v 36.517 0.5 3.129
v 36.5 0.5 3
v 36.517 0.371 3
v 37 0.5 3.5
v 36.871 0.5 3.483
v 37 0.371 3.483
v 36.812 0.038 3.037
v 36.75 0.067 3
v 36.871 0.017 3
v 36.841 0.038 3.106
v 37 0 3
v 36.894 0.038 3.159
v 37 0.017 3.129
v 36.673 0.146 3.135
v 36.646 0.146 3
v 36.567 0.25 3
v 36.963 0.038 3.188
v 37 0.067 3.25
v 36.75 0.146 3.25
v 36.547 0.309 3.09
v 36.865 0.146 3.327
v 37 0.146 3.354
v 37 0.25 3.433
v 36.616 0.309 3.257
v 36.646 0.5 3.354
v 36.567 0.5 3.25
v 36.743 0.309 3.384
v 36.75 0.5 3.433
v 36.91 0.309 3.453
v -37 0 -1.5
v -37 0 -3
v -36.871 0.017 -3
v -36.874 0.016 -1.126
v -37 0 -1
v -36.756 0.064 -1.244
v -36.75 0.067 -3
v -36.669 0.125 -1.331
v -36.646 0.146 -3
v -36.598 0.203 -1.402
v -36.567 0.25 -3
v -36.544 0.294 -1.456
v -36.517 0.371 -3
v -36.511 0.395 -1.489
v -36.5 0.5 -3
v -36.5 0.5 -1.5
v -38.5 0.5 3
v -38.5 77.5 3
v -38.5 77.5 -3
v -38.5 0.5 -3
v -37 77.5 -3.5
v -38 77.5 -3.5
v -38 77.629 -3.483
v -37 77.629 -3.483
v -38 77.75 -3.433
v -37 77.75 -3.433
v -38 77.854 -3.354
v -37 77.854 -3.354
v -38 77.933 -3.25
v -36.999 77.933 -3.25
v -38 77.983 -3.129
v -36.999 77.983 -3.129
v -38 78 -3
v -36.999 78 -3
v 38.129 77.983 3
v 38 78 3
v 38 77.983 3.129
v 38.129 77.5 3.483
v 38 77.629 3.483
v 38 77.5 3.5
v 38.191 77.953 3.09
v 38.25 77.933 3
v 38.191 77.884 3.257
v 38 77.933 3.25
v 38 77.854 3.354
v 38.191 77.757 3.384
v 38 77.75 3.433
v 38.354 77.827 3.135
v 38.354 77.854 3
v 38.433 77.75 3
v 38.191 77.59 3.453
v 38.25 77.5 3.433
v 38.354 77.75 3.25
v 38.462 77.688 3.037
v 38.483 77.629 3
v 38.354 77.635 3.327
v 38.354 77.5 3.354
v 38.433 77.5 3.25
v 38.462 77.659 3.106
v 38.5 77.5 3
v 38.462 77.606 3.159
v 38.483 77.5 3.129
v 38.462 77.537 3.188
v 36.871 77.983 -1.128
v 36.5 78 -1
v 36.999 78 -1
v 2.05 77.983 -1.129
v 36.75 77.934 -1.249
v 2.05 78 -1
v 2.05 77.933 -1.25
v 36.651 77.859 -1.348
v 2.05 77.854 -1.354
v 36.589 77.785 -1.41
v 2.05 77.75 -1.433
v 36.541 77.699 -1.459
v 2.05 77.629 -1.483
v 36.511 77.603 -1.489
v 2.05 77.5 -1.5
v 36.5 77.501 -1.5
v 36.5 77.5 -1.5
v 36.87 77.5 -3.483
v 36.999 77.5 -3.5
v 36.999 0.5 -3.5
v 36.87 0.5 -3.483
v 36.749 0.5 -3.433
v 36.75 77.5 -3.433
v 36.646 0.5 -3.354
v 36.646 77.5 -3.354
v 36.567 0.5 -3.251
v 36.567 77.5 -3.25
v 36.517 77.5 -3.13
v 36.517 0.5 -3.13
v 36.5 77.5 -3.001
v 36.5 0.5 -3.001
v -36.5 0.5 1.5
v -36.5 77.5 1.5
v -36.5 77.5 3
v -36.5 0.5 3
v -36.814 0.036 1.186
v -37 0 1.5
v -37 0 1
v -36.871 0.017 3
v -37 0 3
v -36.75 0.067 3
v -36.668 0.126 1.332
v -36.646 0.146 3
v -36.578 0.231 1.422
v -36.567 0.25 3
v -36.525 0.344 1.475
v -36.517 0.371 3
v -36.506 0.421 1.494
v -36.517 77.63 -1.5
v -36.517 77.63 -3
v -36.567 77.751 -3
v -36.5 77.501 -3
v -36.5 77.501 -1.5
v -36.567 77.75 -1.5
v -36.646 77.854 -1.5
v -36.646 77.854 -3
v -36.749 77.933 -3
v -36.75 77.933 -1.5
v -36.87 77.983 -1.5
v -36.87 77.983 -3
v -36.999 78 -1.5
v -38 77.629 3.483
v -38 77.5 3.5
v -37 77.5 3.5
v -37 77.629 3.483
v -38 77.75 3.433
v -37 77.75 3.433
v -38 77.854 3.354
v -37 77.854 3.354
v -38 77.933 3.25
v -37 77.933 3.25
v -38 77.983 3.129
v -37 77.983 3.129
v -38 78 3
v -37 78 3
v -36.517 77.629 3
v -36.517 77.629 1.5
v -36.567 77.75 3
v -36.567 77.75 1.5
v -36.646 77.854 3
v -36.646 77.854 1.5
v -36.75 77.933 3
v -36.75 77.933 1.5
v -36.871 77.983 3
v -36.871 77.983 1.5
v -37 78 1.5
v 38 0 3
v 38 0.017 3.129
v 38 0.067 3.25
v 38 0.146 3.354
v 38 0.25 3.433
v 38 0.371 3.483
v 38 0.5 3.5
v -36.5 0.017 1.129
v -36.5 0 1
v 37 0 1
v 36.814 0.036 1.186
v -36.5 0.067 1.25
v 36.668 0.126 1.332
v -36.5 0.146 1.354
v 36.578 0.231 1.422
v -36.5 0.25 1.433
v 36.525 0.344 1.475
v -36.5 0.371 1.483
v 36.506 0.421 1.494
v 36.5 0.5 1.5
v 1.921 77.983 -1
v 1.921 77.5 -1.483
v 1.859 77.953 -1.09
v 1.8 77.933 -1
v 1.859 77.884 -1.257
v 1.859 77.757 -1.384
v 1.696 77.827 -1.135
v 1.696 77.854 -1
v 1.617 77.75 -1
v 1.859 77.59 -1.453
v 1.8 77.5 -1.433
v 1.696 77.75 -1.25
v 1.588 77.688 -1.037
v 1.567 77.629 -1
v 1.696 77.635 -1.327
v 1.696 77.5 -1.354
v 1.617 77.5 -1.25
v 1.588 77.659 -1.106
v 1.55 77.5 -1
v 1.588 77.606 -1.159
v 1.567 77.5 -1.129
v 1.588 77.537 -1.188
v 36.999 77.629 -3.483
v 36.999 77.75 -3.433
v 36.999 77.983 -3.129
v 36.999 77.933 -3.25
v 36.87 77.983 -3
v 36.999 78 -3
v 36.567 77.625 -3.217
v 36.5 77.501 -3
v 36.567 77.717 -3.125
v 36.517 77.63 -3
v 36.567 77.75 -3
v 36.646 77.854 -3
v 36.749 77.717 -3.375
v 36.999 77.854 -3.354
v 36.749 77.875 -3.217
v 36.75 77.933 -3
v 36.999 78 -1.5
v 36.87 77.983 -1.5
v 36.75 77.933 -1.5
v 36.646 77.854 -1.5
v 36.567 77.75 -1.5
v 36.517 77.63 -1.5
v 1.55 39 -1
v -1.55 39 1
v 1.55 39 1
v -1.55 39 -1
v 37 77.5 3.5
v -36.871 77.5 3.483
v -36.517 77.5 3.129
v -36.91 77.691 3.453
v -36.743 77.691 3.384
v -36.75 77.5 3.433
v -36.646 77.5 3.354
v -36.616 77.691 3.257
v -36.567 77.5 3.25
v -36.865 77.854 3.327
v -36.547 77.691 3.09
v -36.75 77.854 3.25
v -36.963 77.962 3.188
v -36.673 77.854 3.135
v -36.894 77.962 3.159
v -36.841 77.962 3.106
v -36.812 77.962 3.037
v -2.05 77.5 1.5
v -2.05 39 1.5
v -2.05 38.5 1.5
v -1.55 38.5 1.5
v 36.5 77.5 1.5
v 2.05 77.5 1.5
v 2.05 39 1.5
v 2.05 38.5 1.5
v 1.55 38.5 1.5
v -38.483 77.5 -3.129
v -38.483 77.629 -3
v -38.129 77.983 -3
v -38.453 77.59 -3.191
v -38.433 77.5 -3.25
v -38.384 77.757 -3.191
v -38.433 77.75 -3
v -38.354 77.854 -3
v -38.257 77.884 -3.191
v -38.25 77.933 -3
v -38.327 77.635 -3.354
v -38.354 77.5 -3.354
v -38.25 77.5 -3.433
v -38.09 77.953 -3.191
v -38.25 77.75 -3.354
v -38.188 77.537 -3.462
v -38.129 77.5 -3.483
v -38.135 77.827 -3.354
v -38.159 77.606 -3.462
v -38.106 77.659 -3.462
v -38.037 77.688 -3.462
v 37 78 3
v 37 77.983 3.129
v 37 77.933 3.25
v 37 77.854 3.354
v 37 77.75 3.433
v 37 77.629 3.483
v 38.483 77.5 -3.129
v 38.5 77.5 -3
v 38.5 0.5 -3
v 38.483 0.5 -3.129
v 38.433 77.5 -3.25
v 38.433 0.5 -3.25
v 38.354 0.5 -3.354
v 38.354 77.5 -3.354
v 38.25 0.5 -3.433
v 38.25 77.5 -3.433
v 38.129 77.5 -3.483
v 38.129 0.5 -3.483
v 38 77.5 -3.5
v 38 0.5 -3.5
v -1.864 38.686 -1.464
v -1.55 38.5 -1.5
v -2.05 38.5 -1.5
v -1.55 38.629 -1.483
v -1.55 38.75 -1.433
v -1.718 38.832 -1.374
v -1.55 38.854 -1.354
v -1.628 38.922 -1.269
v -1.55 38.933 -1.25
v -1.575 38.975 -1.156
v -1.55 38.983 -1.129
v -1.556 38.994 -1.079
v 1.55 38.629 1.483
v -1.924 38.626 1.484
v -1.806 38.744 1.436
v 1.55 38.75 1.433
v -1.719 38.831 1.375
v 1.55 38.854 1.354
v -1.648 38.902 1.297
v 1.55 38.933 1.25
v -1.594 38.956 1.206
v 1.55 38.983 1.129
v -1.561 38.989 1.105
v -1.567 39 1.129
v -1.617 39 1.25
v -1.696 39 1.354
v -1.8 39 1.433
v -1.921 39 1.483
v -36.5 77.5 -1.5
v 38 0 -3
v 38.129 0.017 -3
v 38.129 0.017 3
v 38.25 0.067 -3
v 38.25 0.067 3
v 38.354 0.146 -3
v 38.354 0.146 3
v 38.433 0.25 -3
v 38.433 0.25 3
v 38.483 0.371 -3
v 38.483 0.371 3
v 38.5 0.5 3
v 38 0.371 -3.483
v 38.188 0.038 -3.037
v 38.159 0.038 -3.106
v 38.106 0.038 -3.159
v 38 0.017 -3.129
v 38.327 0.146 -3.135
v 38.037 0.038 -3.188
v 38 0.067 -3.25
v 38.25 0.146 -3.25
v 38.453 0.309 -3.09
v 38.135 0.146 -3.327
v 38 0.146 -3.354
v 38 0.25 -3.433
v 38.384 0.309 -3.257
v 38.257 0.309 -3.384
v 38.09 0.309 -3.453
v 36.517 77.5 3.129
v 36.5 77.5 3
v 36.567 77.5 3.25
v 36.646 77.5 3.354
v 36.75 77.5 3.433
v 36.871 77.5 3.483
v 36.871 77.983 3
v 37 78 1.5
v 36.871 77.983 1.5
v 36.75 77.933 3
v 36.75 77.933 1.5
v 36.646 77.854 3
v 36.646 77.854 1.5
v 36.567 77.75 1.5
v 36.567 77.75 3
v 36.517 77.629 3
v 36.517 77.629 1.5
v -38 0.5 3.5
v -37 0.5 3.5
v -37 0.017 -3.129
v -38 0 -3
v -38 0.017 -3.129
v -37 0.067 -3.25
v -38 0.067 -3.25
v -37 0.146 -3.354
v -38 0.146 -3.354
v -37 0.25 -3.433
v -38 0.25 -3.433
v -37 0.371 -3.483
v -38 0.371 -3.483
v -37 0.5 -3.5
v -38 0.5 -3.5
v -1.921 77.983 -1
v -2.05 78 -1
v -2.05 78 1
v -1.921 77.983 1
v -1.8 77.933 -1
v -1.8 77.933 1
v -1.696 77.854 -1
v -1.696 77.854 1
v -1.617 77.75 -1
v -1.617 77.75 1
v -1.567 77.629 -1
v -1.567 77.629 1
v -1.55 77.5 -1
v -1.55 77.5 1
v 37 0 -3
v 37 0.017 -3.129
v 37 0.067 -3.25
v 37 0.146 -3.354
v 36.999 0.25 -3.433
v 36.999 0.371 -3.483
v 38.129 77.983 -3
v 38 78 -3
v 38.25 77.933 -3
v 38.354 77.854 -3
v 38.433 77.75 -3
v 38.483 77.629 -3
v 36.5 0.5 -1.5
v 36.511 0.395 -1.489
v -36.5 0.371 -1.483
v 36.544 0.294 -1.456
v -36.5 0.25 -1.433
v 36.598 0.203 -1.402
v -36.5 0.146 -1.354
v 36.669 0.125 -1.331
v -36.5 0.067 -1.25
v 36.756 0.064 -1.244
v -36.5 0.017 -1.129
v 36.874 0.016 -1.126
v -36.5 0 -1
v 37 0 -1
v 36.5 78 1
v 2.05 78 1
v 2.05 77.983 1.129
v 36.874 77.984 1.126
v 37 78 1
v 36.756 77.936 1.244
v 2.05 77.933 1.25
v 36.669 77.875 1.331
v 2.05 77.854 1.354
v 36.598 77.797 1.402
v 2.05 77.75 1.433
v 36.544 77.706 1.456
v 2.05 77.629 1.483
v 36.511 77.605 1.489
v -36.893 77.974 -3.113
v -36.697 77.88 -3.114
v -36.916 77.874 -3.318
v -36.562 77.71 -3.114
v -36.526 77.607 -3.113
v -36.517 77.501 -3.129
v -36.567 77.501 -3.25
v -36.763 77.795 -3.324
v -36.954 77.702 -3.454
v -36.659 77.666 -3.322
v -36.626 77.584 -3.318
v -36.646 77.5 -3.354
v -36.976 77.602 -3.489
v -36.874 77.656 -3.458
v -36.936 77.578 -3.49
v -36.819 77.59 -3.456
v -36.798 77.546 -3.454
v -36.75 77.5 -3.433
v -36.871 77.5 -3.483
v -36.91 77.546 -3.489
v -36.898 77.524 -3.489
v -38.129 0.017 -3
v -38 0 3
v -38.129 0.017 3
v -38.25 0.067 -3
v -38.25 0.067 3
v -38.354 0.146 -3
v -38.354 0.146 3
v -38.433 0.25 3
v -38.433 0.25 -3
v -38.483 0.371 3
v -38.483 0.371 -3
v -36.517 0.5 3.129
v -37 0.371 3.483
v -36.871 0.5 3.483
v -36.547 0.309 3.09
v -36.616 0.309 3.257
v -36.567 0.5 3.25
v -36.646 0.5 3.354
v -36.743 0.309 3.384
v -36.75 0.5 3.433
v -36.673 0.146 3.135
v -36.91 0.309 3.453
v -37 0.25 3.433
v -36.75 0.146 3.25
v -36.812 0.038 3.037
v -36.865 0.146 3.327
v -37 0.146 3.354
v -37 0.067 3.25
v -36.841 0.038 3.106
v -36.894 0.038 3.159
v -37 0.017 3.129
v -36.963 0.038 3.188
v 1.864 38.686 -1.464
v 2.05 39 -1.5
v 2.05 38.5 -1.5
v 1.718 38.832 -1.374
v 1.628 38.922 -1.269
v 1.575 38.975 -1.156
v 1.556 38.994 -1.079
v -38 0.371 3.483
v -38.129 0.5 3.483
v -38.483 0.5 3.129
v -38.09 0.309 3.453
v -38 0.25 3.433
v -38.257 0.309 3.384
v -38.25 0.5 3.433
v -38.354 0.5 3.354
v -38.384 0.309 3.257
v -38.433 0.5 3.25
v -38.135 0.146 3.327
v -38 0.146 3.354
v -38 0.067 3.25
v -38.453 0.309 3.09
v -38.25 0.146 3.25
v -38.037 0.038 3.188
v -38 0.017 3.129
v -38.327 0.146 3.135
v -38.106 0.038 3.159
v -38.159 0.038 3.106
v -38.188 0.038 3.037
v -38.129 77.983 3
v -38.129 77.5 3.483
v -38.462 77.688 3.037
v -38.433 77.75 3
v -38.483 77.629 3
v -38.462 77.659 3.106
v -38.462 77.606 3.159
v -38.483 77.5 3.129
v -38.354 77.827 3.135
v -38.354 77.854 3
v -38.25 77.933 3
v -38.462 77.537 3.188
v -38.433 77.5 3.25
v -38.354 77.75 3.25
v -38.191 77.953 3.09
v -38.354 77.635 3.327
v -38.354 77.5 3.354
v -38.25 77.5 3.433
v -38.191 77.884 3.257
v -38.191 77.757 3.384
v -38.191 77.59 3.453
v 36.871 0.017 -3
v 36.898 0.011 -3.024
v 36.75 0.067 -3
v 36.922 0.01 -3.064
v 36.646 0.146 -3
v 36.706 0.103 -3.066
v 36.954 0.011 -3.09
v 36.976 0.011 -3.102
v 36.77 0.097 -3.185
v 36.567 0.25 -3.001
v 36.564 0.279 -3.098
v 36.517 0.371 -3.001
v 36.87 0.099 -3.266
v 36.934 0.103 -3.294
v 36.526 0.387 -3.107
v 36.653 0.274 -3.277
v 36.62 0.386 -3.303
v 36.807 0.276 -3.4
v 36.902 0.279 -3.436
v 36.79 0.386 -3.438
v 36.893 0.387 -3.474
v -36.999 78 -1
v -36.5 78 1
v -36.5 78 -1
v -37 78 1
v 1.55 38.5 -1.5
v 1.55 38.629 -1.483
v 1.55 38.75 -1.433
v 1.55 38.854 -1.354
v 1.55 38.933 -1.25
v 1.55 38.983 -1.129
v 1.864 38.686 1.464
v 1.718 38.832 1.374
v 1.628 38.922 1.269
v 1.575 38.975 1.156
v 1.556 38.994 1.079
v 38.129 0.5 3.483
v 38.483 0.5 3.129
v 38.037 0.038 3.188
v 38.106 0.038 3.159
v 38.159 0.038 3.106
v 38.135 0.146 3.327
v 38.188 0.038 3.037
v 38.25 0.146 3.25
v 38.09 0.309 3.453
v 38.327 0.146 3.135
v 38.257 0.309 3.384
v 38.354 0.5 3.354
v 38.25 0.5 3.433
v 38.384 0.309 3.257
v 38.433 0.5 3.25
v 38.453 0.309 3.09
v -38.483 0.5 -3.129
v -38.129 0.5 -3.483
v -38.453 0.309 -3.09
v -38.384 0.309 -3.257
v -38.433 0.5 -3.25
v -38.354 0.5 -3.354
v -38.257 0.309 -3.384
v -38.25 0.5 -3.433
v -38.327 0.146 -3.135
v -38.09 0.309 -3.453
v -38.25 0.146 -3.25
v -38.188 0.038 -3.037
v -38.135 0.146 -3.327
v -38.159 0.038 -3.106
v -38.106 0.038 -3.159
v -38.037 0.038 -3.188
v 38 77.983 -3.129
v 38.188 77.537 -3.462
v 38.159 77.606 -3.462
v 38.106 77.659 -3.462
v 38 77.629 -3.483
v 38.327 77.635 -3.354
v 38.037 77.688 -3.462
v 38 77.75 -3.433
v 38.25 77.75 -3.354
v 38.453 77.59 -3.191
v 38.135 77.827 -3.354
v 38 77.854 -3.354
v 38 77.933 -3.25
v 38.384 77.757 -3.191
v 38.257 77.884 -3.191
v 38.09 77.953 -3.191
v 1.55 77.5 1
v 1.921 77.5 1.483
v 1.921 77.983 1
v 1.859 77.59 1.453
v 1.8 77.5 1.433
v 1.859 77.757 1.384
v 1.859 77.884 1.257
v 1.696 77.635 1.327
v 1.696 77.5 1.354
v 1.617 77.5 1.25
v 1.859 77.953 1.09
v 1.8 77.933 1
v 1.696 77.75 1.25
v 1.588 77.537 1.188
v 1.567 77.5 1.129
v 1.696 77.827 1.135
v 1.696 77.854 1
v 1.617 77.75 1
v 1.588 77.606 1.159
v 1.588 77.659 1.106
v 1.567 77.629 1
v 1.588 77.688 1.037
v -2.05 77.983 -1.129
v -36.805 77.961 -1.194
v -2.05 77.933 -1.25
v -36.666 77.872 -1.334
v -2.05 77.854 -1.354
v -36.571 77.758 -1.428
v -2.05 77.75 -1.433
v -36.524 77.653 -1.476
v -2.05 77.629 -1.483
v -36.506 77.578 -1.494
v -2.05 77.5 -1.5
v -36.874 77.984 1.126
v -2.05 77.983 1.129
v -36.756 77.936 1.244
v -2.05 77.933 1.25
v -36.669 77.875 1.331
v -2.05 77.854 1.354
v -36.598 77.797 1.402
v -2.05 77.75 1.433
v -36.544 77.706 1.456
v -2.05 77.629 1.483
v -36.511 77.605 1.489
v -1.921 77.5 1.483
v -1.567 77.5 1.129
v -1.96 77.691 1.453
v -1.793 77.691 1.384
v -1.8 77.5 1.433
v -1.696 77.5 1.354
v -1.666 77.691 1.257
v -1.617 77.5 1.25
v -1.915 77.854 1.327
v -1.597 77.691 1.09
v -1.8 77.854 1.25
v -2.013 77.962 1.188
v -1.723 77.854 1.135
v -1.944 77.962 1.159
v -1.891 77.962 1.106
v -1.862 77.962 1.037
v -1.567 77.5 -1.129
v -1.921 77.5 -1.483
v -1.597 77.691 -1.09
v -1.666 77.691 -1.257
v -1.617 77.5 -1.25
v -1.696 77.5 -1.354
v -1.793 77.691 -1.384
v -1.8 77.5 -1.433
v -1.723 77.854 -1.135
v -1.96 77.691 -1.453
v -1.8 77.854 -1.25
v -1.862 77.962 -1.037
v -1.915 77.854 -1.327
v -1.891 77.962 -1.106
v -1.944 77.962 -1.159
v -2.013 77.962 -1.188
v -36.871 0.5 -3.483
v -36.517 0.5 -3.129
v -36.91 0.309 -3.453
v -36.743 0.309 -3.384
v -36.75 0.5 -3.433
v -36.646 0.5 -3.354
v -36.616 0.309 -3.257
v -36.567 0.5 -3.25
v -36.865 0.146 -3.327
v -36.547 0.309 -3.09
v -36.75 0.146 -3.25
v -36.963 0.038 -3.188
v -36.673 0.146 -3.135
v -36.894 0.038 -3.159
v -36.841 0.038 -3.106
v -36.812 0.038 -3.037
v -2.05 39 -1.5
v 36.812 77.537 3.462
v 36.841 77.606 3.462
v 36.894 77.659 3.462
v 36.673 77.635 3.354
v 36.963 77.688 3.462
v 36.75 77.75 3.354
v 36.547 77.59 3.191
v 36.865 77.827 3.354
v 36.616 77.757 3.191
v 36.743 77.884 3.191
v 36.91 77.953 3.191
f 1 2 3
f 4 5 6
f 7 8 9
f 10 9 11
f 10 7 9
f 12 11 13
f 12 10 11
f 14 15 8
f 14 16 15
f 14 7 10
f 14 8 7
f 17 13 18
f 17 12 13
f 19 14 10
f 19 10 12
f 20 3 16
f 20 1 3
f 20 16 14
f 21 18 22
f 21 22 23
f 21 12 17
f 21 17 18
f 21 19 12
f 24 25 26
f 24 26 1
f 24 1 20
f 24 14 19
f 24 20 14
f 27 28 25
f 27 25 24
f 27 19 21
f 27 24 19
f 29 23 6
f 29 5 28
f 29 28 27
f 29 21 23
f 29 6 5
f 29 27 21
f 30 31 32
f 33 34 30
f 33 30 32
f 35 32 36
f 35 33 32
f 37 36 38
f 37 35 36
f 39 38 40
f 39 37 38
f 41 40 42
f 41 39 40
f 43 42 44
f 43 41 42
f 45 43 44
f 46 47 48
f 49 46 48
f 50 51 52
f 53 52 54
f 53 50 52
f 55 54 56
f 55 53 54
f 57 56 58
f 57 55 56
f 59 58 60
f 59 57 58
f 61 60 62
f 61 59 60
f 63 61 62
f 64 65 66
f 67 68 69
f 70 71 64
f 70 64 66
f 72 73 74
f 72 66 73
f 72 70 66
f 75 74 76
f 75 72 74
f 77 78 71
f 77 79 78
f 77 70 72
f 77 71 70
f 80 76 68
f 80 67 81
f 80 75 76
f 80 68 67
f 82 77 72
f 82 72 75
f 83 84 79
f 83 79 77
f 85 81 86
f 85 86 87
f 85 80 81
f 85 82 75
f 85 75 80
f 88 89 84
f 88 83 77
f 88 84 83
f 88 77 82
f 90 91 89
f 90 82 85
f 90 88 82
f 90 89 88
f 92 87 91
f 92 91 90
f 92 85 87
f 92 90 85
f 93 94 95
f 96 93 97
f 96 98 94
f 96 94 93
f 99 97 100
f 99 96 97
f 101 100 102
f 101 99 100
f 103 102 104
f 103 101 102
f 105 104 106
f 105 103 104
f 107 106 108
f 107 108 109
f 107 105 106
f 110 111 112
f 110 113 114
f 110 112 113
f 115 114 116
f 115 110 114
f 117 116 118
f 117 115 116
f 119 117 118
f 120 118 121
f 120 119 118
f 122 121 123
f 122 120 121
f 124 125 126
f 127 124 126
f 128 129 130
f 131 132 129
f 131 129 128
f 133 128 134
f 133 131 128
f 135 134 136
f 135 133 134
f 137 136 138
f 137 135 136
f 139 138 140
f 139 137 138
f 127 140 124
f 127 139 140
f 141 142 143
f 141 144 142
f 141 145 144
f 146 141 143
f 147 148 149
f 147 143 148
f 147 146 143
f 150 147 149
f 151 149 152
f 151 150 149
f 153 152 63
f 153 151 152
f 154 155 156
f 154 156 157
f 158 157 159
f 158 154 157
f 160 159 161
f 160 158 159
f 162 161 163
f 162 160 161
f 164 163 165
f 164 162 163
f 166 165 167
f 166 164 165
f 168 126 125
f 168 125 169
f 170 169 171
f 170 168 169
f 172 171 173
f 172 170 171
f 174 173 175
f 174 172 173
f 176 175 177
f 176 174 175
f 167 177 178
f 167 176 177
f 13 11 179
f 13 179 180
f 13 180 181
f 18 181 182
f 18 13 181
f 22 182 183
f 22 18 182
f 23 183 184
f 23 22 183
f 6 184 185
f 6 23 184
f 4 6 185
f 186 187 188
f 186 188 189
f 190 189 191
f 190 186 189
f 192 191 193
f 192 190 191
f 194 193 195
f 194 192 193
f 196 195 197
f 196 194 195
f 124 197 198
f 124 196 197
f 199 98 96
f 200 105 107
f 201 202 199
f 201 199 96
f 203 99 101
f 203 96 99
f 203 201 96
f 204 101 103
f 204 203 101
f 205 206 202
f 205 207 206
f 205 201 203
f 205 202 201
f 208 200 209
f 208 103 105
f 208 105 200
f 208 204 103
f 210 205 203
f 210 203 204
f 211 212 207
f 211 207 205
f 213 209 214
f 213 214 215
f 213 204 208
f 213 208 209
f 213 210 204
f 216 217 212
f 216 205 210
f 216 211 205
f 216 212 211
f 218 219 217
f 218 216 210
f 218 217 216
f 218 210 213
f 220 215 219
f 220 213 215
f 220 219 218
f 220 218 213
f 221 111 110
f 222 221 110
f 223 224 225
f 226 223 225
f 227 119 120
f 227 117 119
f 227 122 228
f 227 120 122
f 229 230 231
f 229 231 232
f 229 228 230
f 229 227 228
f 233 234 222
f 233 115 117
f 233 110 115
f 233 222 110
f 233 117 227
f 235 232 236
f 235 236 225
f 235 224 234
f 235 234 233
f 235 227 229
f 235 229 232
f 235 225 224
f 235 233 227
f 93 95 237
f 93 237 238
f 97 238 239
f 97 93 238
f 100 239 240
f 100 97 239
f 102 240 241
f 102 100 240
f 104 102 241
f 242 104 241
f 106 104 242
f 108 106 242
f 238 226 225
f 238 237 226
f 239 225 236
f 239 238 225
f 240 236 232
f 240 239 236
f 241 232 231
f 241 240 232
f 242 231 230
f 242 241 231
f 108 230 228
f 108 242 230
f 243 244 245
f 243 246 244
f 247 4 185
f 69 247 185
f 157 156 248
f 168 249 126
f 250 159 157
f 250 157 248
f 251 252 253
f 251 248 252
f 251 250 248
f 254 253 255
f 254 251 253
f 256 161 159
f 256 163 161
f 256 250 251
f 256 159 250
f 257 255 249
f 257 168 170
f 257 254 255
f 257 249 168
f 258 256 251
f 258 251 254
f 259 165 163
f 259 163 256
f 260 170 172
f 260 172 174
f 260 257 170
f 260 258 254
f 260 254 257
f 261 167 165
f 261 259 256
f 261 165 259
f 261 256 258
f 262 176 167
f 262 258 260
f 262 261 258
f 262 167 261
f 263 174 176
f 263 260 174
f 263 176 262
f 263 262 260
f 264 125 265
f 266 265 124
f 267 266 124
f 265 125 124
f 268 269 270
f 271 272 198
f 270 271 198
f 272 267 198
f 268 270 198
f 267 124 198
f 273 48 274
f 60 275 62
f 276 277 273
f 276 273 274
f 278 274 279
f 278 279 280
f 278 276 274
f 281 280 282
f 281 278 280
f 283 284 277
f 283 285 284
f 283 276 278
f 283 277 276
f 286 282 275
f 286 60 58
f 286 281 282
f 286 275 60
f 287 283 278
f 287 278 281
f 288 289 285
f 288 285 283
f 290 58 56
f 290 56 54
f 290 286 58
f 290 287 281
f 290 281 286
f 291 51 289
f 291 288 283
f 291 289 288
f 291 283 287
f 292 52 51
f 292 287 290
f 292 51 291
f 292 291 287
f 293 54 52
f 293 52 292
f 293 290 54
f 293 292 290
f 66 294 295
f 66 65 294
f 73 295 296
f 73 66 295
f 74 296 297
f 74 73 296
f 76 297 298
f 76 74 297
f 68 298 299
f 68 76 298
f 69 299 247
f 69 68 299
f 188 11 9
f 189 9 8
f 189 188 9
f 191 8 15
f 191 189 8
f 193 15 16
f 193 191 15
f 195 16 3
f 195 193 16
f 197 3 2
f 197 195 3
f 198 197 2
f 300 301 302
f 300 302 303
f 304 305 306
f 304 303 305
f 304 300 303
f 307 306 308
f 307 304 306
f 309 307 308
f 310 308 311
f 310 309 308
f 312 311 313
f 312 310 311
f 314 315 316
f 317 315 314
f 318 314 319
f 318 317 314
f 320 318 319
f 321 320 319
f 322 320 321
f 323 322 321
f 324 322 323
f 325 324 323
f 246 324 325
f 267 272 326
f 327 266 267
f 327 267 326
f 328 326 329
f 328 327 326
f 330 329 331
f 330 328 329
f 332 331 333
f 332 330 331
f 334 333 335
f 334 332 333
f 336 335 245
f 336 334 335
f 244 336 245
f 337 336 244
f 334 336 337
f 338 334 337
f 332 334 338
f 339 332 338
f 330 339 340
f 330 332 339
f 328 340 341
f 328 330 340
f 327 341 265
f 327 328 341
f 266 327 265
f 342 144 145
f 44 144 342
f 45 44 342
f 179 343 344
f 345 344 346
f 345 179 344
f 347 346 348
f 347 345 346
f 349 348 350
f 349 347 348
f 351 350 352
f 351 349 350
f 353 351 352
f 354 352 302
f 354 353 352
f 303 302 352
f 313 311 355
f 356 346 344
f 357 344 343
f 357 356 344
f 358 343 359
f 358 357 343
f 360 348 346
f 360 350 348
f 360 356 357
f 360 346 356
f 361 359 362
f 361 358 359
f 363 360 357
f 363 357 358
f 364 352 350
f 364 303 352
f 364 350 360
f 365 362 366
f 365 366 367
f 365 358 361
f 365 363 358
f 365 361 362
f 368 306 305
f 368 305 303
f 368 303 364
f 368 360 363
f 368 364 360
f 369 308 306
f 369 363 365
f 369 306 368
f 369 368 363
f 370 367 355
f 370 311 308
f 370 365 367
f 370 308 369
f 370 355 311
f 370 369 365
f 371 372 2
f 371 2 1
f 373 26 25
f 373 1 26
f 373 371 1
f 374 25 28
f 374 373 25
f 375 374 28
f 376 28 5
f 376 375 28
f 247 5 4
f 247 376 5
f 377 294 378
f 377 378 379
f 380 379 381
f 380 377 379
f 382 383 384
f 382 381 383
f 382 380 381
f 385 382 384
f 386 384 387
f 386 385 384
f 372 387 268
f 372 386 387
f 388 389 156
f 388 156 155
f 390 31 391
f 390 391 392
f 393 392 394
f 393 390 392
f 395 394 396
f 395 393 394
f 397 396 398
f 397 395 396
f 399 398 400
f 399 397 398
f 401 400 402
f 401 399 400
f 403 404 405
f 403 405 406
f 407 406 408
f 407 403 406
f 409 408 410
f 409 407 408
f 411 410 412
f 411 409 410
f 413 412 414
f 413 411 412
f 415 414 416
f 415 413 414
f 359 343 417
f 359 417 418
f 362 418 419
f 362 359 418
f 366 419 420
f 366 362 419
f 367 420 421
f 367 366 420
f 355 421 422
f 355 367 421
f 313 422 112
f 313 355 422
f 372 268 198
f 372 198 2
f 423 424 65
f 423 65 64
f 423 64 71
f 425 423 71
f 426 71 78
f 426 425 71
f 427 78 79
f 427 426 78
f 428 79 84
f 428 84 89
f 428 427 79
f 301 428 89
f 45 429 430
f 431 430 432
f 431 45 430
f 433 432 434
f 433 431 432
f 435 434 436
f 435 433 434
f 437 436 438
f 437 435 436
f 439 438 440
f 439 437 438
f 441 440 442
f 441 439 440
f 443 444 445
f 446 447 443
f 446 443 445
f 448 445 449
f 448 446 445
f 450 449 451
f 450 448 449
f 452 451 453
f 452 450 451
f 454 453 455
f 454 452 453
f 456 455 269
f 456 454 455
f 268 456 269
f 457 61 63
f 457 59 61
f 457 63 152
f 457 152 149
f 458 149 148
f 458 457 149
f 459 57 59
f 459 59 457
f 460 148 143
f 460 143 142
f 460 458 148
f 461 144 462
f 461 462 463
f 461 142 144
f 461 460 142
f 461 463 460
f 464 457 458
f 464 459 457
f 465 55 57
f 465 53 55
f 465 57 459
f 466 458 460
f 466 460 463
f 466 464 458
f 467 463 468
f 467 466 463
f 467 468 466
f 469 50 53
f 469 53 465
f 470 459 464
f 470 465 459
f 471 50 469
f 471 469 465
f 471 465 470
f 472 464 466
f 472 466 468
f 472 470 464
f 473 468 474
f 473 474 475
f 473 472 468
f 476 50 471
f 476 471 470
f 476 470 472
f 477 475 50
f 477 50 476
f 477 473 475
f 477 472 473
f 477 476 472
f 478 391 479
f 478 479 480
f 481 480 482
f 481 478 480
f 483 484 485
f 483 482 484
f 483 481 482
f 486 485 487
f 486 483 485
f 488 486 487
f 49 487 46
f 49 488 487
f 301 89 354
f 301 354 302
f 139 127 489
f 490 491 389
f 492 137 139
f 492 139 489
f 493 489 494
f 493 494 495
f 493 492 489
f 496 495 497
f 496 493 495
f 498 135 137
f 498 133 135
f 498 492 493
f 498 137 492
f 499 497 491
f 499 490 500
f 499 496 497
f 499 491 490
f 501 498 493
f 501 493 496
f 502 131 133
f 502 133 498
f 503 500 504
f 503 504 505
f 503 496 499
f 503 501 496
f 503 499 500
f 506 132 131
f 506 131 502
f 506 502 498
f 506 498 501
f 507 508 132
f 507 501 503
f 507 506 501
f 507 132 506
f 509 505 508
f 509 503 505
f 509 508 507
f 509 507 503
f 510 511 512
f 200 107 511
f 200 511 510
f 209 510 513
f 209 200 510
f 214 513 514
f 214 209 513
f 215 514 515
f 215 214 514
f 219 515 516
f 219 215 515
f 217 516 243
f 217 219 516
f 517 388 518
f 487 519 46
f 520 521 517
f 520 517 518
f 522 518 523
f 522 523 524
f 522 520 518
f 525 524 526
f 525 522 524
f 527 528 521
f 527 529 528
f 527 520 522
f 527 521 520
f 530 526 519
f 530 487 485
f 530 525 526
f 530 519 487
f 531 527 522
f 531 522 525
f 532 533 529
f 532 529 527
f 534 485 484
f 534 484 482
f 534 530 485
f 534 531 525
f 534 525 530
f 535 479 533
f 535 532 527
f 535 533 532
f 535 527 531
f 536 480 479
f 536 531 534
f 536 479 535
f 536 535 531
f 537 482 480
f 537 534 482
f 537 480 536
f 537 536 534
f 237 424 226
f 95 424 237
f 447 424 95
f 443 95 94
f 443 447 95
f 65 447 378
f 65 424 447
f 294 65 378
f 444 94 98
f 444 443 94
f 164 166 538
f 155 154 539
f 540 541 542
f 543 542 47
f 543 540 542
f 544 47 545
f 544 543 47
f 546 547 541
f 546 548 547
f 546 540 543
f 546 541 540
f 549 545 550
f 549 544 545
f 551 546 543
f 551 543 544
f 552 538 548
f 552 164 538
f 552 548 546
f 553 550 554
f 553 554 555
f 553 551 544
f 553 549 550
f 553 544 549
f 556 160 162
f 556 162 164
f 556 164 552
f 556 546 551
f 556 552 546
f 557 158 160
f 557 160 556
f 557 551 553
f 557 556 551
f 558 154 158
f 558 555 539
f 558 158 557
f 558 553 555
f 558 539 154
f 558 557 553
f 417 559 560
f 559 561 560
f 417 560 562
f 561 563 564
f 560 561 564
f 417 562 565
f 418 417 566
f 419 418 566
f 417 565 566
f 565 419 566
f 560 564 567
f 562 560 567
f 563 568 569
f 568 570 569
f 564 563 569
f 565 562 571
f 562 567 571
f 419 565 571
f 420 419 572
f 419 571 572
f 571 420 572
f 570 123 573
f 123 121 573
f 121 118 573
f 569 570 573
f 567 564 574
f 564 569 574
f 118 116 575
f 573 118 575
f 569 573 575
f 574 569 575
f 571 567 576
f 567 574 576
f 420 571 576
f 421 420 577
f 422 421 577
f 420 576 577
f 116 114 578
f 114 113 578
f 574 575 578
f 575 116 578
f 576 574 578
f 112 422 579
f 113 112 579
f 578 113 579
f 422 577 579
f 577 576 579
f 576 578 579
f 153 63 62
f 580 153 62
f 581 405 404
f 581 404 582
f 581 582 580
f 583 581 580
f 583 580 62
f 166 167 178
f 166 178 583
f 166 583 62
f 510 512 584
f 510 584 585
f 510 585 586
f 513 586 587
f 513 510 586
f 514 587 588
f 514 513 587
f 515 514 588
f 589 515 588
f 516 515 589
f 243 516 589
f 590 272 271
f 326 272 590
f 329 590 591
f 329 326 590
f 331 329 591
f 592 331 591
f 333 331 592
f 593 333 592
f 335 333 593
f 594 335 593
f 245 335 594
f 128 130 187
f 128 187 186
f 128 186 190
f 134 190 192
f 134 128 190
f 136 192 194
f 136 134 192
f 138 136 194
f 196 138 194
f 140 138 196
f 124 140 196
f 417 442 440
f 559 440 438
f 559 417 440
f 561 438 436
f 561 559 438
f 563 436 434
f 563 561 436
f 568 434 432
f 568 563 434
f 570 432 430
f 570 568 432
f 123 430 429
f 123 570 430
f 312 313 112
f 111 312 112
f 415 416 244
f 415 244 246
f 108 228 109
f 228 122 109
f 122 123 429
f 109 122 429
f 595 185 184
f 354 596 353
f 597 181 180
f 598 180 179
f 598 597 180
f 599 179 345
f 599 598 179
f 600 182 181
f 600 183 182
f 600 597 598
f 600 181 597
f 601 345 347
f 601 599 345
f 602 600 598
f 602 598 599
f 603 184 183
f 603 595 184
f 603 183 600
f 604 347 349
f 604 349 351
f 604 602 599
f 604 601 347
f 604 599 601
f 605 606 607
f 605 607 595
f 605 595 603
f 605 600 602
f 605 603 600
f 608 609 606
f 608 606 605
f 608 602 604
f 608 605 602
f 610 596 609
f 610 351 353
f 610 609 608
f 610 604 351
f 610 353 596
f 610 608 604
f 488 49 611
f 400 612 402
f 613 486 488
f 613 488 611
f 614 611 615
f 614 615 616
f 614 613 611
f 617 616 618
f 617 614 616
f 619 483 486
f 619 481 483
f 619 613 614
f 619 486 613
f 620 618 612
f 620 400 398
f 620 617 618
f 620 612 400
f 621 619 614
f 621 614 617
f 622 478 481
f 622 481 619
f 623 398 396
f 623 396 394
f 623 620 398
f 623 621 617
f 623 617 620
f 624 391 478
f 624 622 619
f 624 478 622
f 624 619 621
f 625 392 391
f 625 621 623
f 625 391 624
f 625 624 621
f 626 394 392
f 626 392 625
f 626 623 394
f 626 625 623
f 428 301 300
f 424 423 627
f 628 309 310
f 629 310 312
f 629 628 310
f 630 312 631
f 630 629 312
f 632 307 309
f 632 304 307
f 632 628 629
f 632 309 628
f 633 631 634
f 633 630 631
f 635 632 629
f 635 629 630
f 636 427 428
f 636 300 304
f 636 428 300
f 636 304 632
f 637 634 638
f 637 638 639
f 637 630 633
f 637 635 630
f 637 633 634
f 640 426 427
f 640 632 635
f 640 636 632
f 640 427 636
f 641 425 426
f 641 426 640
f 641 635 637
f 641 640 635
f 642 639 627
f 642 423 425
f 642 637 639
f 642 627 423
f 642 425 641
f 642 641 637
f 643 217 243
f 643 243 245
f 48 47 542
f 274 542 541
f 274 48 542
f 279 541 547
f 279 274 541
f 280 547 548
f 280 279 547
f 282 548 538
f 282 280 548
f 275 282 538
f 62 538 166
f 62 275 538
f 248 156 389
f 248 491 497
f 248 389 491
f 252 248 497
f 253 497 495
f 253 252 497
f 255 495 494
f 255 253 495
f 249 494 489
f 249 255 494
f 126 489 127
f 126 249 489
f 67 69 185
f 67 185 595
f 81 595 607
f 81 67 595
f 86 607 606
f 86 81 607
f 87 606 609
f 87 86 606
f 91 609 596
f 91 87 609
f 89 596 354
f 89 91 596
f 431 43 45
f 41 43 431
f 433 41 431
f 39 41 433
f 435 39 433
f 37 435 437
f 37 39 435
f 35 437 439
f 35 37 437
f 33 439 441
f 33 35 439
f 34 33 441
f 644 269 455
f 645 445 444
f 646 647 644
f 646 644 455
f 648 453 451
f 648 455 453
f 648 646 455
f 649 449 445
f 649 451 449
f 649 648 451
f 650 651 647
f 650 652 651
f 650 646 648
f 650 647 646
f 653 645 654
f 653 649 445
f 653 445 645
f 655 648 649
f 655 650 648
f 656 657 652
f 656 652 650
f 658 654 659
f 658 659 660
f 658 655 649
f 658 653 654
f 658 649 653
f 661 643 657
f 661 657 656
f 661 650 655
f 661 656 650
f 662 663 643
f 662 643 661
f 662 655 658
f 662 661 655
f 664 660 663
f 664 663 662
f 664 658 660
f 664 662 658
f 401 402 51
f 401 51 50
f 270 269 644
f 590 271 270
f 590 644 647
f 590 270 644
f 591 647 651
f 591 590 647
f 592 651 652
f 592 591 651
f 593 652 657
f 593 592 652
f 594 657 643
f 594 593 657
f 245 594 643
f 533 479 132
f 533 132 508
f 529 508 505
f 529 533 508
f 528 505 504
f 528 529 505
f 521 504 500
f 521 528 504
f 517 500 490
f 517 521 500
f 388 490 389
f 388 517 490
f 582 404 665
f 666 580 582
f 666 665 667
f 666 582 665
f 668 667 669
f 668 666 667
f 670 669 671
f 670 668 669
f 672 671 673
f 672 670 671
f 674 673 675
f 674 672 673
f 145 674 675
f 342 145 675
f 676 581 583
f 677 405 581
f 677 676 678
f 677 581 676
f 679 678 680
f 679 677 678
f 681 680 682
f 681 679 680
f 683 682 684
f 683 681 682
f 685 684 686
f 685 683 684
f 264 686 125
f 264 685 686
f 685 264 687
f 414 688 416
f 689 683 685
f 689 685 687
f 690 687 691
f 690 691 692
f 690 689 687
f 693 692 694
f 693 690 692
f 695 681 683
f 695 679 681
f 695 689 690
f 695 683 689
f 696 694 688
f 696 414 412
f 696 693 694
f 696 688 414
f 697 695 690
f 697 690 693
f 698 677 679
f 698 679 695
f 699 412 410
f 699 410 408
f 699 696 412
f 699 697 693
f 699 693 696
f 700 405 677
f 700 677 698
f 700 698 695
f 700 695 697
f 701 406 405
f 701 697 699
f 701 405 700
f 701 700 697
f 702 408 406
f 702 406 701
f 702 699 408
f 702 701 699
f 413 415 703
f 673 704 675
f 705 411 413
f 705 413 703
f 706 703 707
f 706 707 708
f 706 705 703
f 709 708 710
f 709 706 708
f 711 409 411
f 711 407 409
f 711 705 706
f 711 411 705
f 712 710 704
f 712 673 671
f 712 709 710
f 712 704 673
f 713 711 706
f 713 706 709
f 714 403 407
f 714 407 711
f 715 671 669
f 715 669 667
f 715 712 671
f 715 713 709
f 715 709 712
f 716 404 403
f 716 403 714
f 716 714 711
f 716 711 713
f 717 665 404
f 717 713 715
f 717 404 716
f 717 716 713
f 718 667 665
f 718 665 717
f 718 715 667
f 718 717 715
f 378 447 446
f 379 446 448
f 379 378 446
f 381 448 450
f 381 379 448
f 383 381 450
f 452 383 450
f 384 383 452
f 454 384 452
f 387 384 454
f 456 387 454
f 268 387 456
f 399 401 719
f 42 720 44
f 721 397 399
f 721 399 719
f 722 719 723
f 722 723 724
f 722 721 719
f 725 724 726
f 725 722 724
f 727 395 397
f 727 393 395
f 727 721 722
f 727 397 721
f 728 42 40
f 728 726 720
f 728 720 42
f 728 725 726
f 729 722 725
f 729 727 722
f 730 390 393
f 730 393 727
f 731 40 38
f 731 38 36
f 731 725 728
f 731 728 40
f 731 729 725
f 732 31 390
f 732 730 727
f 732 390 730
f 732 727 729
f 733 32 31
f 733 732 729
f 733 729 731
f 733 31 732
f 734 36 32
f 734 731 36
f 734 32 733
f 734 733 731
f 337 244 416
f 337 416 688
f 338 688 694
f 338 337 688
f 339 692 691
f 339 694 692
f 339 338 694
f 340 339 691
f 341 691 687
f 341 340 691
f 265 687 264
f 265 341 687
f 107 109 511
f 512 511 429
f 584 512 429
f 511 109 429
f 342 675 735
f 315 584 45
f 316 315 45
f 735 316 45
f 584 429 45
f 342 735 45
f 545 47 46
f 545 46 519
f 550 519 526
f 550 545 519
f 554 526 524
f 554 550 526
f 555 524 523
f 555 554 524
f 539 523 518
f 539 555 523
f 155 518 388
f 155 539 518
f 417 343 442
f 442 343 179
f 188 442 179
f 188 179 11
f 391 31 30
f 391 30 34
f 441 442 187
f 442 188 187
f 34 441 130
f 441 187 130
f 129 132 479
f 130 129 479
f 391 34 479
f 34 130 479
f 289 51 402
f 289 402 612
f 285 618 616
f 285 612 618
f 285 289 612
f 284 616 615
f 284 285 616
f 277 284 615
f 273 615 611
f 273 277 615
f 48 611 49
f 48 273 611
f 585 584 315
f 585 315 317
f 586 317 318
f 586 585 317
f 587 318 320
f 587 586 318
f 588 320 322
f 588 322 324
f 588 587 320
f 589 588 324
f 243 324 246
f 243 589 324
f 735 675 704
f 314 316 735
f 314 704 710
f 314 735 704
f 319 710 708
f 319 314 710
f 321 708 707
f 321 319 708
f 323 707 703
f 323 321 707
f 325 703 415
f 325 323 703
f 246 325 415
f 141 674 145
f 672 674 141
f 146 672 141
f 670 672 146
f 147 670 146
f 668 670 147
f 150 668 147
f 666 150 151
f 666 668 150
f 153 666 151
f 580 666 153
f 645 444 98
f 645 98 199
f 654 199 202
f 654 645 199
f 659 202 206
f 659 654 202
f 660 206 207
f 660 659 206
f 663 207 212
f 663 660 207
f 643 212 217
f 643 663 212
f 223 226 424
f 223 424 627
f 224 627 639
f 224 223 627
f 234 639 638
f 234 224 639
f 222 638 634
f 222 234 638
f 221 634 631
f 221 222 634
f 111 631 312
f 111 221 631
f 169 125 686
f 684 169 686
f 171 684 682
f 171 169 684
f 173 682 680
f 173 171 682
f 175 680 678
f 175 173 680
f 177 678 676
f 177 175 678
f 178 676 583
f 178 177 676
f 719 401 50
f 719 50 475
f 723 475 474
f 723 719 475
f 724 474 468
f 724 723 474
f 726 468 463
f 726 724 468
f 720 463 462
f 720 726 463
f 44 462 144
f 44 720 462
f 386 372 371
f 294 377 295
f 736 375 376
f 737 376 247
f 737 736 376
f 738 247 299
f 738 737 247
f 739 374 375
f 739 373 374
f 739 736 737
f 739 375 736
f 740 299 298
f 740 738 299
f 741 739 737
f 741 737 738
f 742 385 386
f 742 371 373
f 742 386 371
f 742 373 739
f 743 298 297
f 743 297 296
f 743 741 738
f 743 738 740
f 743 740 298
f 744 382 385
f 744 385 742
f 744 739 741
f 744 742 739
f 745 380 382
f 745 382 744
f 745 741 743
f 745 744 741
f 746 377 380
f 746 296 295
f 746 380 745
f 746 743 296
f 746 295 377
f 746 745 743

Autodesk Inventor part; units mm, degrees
ref_plane "YZ Plane" through (0, 0, 0) normal (1, 0, 0) x (0, 1, 0)
ref_plane "XZ Plane" through (0, 0, 0) normal (0, 1, 0) x (-1, 0, 0)
ref_plane "XY Plane" through (0, 0, 0) normal (0, 0, 1) x (1, 0, 0)
sketch "スケッチ1" plane through (0, 0, 0) normal (0, 1, 0) x (-1, 0, 0)
  line L0 (37.5, 1.5) -> (-37.5, 1.5)
  line L1 (-37.5, 1.5) -> (-37.5, -1.5)
  line L2 (-37.5, -1.5) -> (37.5, -1.5)
  line L3 (37.5, -1.5) -> (37.5, 1.5)
  line L4 (37.5, 1.5) -> (-37.5, -1.5) construction
  line L5 (-37.5, 1.5) -> (37.5, -1.5) construction
  line L6 (36.5, 3.5) -> (38.5, 3.5)
  line L7 (38.5, 3.5) -> (38.5, -3.5)
  line L8 (38.5, -3.5) -> (36.5, -3.5)
  line L9 (36.5, -3.5) -> (36.5, 3.5)
  line L10 (36.5, 3.5) -> (38.5, -3.5) construction
  line L11 (38.5, 3.5) -> (36.5, -3.5) construction
  line L12 (-36.5, 3.5) -> (-38.5, 3.5)
  line L13 (-38.5, 3.5) -> (-38.5, -3.5)
  line L14 (-38.5, -3.5) -> (-36.5, -3.5)
  line L15 (-36.5, -3.5) -> (-36.5, 3.5)
  line L16 (-36.5, 3.5) -> (-38.5, -3.5) construction
  line L17 (-38.5, 3.5) -> (-36.5, -3.5) construction
  point P0 (0, 0)
  point P1 (37.5, 0)
  point P2 (-37.5, 0)
  dimension "d0" = 75
  dimension "d1" = 3
  dimension "d2" = 2
  dimension "d3" = 7
  dimension "d4" = 2
  dimension "d5" = 7
extrude "押し出し1" add sketch "スケッチ1" along normal blind 78
sketch "スケッチ2" plane through (0, 78, 0) normal (0, 1, 0) x (1, 0, 0)
  line L0 (1.55, -1.5) -> (-1.55, -1.5)
  line L1 (-1.55, -1.5) -> (-1.55, 1.5)
  line L2 (-1.55, 1.5) -> (1.55, 1.5)
  line L3 (1.55, 1.5) -> (1.55, -1.5)
  line L4 (1.55, -1.5) -> (-1.55, 1.5) construction
  line L5 (-1.55, -1.5) -> (1.55, 1.5) construction
  point P0 (0, 0)
  dimension "d8" = 3.1
  dimension "d9" = 3
extrude "押し出し2" cut sketch "スケッチ2" against normal blind 39
fillet "フィレット1" radius 0.5 33 edges at (19.025, 78, -1.5) (19.025, 78, 1.5) (1.55, 78, 0) (1.55, 58.5, 1.5) (1.55, 58.5, -1.5) (-1.55, 58.5, -1.5) (0, 39, -1.5) (0, 39, 1.5) (-1.55, 58.5, 1.5) (-1.55, 78, 0) (-19.025, 78, 1.5) (-19.025, 78, -1.5) (36.5, 78, 2.5) (37.5, 78, 3.5) (38.5, 78, 0) (37.5, 78, -3.5) (36.5, 78, -2.5) (36.5, 39, -3.5) (38.5, 39, -3.5) (38.5, 39, 3.5) (36.5, 39, 3.5) (-36.5, 39, 3.5) (-37.5, 78, 3.5) (-36.5, 78, 2.5) (-38.5, 78, 0) (-36.5, 78, -2.5) (-37.5, 78, -3.5) (-36.5, 39, -3.5) (-38.5, 39, -3.5) (-38.5, 39, 3.5) (-38.5, 0, 0) (-37.5, 0, 3.5) (-36.5, 0, 2.5)
fillet "フィレット2" radius 0.5 20 edges at (-36.75, 0, 1.5) (0, 0, 1.5) (0, 0, -1.5) (-37, 0, -2.25) (-37, 0, 2.25) (-37.5, 0, 3) (36.6464, 0, 3.3536) (-38, 0, 0) (-37.5, 0, -3) (38.3536, 0, 3.3536) (38.3536, 0, -3.3536) (36.6462, 0, -3.3538) (-38.3536, 0.1464, 3) (-38.5, 0.5, 0) (-38.3536, 0.1464, -3) (37.5, 0, 3.5) (38.5, 0, 0) (37.4995, 0, -3.5) (36.5, 0, -2.2505) (36.5, 0, 2.25)
properties part number "partition"
